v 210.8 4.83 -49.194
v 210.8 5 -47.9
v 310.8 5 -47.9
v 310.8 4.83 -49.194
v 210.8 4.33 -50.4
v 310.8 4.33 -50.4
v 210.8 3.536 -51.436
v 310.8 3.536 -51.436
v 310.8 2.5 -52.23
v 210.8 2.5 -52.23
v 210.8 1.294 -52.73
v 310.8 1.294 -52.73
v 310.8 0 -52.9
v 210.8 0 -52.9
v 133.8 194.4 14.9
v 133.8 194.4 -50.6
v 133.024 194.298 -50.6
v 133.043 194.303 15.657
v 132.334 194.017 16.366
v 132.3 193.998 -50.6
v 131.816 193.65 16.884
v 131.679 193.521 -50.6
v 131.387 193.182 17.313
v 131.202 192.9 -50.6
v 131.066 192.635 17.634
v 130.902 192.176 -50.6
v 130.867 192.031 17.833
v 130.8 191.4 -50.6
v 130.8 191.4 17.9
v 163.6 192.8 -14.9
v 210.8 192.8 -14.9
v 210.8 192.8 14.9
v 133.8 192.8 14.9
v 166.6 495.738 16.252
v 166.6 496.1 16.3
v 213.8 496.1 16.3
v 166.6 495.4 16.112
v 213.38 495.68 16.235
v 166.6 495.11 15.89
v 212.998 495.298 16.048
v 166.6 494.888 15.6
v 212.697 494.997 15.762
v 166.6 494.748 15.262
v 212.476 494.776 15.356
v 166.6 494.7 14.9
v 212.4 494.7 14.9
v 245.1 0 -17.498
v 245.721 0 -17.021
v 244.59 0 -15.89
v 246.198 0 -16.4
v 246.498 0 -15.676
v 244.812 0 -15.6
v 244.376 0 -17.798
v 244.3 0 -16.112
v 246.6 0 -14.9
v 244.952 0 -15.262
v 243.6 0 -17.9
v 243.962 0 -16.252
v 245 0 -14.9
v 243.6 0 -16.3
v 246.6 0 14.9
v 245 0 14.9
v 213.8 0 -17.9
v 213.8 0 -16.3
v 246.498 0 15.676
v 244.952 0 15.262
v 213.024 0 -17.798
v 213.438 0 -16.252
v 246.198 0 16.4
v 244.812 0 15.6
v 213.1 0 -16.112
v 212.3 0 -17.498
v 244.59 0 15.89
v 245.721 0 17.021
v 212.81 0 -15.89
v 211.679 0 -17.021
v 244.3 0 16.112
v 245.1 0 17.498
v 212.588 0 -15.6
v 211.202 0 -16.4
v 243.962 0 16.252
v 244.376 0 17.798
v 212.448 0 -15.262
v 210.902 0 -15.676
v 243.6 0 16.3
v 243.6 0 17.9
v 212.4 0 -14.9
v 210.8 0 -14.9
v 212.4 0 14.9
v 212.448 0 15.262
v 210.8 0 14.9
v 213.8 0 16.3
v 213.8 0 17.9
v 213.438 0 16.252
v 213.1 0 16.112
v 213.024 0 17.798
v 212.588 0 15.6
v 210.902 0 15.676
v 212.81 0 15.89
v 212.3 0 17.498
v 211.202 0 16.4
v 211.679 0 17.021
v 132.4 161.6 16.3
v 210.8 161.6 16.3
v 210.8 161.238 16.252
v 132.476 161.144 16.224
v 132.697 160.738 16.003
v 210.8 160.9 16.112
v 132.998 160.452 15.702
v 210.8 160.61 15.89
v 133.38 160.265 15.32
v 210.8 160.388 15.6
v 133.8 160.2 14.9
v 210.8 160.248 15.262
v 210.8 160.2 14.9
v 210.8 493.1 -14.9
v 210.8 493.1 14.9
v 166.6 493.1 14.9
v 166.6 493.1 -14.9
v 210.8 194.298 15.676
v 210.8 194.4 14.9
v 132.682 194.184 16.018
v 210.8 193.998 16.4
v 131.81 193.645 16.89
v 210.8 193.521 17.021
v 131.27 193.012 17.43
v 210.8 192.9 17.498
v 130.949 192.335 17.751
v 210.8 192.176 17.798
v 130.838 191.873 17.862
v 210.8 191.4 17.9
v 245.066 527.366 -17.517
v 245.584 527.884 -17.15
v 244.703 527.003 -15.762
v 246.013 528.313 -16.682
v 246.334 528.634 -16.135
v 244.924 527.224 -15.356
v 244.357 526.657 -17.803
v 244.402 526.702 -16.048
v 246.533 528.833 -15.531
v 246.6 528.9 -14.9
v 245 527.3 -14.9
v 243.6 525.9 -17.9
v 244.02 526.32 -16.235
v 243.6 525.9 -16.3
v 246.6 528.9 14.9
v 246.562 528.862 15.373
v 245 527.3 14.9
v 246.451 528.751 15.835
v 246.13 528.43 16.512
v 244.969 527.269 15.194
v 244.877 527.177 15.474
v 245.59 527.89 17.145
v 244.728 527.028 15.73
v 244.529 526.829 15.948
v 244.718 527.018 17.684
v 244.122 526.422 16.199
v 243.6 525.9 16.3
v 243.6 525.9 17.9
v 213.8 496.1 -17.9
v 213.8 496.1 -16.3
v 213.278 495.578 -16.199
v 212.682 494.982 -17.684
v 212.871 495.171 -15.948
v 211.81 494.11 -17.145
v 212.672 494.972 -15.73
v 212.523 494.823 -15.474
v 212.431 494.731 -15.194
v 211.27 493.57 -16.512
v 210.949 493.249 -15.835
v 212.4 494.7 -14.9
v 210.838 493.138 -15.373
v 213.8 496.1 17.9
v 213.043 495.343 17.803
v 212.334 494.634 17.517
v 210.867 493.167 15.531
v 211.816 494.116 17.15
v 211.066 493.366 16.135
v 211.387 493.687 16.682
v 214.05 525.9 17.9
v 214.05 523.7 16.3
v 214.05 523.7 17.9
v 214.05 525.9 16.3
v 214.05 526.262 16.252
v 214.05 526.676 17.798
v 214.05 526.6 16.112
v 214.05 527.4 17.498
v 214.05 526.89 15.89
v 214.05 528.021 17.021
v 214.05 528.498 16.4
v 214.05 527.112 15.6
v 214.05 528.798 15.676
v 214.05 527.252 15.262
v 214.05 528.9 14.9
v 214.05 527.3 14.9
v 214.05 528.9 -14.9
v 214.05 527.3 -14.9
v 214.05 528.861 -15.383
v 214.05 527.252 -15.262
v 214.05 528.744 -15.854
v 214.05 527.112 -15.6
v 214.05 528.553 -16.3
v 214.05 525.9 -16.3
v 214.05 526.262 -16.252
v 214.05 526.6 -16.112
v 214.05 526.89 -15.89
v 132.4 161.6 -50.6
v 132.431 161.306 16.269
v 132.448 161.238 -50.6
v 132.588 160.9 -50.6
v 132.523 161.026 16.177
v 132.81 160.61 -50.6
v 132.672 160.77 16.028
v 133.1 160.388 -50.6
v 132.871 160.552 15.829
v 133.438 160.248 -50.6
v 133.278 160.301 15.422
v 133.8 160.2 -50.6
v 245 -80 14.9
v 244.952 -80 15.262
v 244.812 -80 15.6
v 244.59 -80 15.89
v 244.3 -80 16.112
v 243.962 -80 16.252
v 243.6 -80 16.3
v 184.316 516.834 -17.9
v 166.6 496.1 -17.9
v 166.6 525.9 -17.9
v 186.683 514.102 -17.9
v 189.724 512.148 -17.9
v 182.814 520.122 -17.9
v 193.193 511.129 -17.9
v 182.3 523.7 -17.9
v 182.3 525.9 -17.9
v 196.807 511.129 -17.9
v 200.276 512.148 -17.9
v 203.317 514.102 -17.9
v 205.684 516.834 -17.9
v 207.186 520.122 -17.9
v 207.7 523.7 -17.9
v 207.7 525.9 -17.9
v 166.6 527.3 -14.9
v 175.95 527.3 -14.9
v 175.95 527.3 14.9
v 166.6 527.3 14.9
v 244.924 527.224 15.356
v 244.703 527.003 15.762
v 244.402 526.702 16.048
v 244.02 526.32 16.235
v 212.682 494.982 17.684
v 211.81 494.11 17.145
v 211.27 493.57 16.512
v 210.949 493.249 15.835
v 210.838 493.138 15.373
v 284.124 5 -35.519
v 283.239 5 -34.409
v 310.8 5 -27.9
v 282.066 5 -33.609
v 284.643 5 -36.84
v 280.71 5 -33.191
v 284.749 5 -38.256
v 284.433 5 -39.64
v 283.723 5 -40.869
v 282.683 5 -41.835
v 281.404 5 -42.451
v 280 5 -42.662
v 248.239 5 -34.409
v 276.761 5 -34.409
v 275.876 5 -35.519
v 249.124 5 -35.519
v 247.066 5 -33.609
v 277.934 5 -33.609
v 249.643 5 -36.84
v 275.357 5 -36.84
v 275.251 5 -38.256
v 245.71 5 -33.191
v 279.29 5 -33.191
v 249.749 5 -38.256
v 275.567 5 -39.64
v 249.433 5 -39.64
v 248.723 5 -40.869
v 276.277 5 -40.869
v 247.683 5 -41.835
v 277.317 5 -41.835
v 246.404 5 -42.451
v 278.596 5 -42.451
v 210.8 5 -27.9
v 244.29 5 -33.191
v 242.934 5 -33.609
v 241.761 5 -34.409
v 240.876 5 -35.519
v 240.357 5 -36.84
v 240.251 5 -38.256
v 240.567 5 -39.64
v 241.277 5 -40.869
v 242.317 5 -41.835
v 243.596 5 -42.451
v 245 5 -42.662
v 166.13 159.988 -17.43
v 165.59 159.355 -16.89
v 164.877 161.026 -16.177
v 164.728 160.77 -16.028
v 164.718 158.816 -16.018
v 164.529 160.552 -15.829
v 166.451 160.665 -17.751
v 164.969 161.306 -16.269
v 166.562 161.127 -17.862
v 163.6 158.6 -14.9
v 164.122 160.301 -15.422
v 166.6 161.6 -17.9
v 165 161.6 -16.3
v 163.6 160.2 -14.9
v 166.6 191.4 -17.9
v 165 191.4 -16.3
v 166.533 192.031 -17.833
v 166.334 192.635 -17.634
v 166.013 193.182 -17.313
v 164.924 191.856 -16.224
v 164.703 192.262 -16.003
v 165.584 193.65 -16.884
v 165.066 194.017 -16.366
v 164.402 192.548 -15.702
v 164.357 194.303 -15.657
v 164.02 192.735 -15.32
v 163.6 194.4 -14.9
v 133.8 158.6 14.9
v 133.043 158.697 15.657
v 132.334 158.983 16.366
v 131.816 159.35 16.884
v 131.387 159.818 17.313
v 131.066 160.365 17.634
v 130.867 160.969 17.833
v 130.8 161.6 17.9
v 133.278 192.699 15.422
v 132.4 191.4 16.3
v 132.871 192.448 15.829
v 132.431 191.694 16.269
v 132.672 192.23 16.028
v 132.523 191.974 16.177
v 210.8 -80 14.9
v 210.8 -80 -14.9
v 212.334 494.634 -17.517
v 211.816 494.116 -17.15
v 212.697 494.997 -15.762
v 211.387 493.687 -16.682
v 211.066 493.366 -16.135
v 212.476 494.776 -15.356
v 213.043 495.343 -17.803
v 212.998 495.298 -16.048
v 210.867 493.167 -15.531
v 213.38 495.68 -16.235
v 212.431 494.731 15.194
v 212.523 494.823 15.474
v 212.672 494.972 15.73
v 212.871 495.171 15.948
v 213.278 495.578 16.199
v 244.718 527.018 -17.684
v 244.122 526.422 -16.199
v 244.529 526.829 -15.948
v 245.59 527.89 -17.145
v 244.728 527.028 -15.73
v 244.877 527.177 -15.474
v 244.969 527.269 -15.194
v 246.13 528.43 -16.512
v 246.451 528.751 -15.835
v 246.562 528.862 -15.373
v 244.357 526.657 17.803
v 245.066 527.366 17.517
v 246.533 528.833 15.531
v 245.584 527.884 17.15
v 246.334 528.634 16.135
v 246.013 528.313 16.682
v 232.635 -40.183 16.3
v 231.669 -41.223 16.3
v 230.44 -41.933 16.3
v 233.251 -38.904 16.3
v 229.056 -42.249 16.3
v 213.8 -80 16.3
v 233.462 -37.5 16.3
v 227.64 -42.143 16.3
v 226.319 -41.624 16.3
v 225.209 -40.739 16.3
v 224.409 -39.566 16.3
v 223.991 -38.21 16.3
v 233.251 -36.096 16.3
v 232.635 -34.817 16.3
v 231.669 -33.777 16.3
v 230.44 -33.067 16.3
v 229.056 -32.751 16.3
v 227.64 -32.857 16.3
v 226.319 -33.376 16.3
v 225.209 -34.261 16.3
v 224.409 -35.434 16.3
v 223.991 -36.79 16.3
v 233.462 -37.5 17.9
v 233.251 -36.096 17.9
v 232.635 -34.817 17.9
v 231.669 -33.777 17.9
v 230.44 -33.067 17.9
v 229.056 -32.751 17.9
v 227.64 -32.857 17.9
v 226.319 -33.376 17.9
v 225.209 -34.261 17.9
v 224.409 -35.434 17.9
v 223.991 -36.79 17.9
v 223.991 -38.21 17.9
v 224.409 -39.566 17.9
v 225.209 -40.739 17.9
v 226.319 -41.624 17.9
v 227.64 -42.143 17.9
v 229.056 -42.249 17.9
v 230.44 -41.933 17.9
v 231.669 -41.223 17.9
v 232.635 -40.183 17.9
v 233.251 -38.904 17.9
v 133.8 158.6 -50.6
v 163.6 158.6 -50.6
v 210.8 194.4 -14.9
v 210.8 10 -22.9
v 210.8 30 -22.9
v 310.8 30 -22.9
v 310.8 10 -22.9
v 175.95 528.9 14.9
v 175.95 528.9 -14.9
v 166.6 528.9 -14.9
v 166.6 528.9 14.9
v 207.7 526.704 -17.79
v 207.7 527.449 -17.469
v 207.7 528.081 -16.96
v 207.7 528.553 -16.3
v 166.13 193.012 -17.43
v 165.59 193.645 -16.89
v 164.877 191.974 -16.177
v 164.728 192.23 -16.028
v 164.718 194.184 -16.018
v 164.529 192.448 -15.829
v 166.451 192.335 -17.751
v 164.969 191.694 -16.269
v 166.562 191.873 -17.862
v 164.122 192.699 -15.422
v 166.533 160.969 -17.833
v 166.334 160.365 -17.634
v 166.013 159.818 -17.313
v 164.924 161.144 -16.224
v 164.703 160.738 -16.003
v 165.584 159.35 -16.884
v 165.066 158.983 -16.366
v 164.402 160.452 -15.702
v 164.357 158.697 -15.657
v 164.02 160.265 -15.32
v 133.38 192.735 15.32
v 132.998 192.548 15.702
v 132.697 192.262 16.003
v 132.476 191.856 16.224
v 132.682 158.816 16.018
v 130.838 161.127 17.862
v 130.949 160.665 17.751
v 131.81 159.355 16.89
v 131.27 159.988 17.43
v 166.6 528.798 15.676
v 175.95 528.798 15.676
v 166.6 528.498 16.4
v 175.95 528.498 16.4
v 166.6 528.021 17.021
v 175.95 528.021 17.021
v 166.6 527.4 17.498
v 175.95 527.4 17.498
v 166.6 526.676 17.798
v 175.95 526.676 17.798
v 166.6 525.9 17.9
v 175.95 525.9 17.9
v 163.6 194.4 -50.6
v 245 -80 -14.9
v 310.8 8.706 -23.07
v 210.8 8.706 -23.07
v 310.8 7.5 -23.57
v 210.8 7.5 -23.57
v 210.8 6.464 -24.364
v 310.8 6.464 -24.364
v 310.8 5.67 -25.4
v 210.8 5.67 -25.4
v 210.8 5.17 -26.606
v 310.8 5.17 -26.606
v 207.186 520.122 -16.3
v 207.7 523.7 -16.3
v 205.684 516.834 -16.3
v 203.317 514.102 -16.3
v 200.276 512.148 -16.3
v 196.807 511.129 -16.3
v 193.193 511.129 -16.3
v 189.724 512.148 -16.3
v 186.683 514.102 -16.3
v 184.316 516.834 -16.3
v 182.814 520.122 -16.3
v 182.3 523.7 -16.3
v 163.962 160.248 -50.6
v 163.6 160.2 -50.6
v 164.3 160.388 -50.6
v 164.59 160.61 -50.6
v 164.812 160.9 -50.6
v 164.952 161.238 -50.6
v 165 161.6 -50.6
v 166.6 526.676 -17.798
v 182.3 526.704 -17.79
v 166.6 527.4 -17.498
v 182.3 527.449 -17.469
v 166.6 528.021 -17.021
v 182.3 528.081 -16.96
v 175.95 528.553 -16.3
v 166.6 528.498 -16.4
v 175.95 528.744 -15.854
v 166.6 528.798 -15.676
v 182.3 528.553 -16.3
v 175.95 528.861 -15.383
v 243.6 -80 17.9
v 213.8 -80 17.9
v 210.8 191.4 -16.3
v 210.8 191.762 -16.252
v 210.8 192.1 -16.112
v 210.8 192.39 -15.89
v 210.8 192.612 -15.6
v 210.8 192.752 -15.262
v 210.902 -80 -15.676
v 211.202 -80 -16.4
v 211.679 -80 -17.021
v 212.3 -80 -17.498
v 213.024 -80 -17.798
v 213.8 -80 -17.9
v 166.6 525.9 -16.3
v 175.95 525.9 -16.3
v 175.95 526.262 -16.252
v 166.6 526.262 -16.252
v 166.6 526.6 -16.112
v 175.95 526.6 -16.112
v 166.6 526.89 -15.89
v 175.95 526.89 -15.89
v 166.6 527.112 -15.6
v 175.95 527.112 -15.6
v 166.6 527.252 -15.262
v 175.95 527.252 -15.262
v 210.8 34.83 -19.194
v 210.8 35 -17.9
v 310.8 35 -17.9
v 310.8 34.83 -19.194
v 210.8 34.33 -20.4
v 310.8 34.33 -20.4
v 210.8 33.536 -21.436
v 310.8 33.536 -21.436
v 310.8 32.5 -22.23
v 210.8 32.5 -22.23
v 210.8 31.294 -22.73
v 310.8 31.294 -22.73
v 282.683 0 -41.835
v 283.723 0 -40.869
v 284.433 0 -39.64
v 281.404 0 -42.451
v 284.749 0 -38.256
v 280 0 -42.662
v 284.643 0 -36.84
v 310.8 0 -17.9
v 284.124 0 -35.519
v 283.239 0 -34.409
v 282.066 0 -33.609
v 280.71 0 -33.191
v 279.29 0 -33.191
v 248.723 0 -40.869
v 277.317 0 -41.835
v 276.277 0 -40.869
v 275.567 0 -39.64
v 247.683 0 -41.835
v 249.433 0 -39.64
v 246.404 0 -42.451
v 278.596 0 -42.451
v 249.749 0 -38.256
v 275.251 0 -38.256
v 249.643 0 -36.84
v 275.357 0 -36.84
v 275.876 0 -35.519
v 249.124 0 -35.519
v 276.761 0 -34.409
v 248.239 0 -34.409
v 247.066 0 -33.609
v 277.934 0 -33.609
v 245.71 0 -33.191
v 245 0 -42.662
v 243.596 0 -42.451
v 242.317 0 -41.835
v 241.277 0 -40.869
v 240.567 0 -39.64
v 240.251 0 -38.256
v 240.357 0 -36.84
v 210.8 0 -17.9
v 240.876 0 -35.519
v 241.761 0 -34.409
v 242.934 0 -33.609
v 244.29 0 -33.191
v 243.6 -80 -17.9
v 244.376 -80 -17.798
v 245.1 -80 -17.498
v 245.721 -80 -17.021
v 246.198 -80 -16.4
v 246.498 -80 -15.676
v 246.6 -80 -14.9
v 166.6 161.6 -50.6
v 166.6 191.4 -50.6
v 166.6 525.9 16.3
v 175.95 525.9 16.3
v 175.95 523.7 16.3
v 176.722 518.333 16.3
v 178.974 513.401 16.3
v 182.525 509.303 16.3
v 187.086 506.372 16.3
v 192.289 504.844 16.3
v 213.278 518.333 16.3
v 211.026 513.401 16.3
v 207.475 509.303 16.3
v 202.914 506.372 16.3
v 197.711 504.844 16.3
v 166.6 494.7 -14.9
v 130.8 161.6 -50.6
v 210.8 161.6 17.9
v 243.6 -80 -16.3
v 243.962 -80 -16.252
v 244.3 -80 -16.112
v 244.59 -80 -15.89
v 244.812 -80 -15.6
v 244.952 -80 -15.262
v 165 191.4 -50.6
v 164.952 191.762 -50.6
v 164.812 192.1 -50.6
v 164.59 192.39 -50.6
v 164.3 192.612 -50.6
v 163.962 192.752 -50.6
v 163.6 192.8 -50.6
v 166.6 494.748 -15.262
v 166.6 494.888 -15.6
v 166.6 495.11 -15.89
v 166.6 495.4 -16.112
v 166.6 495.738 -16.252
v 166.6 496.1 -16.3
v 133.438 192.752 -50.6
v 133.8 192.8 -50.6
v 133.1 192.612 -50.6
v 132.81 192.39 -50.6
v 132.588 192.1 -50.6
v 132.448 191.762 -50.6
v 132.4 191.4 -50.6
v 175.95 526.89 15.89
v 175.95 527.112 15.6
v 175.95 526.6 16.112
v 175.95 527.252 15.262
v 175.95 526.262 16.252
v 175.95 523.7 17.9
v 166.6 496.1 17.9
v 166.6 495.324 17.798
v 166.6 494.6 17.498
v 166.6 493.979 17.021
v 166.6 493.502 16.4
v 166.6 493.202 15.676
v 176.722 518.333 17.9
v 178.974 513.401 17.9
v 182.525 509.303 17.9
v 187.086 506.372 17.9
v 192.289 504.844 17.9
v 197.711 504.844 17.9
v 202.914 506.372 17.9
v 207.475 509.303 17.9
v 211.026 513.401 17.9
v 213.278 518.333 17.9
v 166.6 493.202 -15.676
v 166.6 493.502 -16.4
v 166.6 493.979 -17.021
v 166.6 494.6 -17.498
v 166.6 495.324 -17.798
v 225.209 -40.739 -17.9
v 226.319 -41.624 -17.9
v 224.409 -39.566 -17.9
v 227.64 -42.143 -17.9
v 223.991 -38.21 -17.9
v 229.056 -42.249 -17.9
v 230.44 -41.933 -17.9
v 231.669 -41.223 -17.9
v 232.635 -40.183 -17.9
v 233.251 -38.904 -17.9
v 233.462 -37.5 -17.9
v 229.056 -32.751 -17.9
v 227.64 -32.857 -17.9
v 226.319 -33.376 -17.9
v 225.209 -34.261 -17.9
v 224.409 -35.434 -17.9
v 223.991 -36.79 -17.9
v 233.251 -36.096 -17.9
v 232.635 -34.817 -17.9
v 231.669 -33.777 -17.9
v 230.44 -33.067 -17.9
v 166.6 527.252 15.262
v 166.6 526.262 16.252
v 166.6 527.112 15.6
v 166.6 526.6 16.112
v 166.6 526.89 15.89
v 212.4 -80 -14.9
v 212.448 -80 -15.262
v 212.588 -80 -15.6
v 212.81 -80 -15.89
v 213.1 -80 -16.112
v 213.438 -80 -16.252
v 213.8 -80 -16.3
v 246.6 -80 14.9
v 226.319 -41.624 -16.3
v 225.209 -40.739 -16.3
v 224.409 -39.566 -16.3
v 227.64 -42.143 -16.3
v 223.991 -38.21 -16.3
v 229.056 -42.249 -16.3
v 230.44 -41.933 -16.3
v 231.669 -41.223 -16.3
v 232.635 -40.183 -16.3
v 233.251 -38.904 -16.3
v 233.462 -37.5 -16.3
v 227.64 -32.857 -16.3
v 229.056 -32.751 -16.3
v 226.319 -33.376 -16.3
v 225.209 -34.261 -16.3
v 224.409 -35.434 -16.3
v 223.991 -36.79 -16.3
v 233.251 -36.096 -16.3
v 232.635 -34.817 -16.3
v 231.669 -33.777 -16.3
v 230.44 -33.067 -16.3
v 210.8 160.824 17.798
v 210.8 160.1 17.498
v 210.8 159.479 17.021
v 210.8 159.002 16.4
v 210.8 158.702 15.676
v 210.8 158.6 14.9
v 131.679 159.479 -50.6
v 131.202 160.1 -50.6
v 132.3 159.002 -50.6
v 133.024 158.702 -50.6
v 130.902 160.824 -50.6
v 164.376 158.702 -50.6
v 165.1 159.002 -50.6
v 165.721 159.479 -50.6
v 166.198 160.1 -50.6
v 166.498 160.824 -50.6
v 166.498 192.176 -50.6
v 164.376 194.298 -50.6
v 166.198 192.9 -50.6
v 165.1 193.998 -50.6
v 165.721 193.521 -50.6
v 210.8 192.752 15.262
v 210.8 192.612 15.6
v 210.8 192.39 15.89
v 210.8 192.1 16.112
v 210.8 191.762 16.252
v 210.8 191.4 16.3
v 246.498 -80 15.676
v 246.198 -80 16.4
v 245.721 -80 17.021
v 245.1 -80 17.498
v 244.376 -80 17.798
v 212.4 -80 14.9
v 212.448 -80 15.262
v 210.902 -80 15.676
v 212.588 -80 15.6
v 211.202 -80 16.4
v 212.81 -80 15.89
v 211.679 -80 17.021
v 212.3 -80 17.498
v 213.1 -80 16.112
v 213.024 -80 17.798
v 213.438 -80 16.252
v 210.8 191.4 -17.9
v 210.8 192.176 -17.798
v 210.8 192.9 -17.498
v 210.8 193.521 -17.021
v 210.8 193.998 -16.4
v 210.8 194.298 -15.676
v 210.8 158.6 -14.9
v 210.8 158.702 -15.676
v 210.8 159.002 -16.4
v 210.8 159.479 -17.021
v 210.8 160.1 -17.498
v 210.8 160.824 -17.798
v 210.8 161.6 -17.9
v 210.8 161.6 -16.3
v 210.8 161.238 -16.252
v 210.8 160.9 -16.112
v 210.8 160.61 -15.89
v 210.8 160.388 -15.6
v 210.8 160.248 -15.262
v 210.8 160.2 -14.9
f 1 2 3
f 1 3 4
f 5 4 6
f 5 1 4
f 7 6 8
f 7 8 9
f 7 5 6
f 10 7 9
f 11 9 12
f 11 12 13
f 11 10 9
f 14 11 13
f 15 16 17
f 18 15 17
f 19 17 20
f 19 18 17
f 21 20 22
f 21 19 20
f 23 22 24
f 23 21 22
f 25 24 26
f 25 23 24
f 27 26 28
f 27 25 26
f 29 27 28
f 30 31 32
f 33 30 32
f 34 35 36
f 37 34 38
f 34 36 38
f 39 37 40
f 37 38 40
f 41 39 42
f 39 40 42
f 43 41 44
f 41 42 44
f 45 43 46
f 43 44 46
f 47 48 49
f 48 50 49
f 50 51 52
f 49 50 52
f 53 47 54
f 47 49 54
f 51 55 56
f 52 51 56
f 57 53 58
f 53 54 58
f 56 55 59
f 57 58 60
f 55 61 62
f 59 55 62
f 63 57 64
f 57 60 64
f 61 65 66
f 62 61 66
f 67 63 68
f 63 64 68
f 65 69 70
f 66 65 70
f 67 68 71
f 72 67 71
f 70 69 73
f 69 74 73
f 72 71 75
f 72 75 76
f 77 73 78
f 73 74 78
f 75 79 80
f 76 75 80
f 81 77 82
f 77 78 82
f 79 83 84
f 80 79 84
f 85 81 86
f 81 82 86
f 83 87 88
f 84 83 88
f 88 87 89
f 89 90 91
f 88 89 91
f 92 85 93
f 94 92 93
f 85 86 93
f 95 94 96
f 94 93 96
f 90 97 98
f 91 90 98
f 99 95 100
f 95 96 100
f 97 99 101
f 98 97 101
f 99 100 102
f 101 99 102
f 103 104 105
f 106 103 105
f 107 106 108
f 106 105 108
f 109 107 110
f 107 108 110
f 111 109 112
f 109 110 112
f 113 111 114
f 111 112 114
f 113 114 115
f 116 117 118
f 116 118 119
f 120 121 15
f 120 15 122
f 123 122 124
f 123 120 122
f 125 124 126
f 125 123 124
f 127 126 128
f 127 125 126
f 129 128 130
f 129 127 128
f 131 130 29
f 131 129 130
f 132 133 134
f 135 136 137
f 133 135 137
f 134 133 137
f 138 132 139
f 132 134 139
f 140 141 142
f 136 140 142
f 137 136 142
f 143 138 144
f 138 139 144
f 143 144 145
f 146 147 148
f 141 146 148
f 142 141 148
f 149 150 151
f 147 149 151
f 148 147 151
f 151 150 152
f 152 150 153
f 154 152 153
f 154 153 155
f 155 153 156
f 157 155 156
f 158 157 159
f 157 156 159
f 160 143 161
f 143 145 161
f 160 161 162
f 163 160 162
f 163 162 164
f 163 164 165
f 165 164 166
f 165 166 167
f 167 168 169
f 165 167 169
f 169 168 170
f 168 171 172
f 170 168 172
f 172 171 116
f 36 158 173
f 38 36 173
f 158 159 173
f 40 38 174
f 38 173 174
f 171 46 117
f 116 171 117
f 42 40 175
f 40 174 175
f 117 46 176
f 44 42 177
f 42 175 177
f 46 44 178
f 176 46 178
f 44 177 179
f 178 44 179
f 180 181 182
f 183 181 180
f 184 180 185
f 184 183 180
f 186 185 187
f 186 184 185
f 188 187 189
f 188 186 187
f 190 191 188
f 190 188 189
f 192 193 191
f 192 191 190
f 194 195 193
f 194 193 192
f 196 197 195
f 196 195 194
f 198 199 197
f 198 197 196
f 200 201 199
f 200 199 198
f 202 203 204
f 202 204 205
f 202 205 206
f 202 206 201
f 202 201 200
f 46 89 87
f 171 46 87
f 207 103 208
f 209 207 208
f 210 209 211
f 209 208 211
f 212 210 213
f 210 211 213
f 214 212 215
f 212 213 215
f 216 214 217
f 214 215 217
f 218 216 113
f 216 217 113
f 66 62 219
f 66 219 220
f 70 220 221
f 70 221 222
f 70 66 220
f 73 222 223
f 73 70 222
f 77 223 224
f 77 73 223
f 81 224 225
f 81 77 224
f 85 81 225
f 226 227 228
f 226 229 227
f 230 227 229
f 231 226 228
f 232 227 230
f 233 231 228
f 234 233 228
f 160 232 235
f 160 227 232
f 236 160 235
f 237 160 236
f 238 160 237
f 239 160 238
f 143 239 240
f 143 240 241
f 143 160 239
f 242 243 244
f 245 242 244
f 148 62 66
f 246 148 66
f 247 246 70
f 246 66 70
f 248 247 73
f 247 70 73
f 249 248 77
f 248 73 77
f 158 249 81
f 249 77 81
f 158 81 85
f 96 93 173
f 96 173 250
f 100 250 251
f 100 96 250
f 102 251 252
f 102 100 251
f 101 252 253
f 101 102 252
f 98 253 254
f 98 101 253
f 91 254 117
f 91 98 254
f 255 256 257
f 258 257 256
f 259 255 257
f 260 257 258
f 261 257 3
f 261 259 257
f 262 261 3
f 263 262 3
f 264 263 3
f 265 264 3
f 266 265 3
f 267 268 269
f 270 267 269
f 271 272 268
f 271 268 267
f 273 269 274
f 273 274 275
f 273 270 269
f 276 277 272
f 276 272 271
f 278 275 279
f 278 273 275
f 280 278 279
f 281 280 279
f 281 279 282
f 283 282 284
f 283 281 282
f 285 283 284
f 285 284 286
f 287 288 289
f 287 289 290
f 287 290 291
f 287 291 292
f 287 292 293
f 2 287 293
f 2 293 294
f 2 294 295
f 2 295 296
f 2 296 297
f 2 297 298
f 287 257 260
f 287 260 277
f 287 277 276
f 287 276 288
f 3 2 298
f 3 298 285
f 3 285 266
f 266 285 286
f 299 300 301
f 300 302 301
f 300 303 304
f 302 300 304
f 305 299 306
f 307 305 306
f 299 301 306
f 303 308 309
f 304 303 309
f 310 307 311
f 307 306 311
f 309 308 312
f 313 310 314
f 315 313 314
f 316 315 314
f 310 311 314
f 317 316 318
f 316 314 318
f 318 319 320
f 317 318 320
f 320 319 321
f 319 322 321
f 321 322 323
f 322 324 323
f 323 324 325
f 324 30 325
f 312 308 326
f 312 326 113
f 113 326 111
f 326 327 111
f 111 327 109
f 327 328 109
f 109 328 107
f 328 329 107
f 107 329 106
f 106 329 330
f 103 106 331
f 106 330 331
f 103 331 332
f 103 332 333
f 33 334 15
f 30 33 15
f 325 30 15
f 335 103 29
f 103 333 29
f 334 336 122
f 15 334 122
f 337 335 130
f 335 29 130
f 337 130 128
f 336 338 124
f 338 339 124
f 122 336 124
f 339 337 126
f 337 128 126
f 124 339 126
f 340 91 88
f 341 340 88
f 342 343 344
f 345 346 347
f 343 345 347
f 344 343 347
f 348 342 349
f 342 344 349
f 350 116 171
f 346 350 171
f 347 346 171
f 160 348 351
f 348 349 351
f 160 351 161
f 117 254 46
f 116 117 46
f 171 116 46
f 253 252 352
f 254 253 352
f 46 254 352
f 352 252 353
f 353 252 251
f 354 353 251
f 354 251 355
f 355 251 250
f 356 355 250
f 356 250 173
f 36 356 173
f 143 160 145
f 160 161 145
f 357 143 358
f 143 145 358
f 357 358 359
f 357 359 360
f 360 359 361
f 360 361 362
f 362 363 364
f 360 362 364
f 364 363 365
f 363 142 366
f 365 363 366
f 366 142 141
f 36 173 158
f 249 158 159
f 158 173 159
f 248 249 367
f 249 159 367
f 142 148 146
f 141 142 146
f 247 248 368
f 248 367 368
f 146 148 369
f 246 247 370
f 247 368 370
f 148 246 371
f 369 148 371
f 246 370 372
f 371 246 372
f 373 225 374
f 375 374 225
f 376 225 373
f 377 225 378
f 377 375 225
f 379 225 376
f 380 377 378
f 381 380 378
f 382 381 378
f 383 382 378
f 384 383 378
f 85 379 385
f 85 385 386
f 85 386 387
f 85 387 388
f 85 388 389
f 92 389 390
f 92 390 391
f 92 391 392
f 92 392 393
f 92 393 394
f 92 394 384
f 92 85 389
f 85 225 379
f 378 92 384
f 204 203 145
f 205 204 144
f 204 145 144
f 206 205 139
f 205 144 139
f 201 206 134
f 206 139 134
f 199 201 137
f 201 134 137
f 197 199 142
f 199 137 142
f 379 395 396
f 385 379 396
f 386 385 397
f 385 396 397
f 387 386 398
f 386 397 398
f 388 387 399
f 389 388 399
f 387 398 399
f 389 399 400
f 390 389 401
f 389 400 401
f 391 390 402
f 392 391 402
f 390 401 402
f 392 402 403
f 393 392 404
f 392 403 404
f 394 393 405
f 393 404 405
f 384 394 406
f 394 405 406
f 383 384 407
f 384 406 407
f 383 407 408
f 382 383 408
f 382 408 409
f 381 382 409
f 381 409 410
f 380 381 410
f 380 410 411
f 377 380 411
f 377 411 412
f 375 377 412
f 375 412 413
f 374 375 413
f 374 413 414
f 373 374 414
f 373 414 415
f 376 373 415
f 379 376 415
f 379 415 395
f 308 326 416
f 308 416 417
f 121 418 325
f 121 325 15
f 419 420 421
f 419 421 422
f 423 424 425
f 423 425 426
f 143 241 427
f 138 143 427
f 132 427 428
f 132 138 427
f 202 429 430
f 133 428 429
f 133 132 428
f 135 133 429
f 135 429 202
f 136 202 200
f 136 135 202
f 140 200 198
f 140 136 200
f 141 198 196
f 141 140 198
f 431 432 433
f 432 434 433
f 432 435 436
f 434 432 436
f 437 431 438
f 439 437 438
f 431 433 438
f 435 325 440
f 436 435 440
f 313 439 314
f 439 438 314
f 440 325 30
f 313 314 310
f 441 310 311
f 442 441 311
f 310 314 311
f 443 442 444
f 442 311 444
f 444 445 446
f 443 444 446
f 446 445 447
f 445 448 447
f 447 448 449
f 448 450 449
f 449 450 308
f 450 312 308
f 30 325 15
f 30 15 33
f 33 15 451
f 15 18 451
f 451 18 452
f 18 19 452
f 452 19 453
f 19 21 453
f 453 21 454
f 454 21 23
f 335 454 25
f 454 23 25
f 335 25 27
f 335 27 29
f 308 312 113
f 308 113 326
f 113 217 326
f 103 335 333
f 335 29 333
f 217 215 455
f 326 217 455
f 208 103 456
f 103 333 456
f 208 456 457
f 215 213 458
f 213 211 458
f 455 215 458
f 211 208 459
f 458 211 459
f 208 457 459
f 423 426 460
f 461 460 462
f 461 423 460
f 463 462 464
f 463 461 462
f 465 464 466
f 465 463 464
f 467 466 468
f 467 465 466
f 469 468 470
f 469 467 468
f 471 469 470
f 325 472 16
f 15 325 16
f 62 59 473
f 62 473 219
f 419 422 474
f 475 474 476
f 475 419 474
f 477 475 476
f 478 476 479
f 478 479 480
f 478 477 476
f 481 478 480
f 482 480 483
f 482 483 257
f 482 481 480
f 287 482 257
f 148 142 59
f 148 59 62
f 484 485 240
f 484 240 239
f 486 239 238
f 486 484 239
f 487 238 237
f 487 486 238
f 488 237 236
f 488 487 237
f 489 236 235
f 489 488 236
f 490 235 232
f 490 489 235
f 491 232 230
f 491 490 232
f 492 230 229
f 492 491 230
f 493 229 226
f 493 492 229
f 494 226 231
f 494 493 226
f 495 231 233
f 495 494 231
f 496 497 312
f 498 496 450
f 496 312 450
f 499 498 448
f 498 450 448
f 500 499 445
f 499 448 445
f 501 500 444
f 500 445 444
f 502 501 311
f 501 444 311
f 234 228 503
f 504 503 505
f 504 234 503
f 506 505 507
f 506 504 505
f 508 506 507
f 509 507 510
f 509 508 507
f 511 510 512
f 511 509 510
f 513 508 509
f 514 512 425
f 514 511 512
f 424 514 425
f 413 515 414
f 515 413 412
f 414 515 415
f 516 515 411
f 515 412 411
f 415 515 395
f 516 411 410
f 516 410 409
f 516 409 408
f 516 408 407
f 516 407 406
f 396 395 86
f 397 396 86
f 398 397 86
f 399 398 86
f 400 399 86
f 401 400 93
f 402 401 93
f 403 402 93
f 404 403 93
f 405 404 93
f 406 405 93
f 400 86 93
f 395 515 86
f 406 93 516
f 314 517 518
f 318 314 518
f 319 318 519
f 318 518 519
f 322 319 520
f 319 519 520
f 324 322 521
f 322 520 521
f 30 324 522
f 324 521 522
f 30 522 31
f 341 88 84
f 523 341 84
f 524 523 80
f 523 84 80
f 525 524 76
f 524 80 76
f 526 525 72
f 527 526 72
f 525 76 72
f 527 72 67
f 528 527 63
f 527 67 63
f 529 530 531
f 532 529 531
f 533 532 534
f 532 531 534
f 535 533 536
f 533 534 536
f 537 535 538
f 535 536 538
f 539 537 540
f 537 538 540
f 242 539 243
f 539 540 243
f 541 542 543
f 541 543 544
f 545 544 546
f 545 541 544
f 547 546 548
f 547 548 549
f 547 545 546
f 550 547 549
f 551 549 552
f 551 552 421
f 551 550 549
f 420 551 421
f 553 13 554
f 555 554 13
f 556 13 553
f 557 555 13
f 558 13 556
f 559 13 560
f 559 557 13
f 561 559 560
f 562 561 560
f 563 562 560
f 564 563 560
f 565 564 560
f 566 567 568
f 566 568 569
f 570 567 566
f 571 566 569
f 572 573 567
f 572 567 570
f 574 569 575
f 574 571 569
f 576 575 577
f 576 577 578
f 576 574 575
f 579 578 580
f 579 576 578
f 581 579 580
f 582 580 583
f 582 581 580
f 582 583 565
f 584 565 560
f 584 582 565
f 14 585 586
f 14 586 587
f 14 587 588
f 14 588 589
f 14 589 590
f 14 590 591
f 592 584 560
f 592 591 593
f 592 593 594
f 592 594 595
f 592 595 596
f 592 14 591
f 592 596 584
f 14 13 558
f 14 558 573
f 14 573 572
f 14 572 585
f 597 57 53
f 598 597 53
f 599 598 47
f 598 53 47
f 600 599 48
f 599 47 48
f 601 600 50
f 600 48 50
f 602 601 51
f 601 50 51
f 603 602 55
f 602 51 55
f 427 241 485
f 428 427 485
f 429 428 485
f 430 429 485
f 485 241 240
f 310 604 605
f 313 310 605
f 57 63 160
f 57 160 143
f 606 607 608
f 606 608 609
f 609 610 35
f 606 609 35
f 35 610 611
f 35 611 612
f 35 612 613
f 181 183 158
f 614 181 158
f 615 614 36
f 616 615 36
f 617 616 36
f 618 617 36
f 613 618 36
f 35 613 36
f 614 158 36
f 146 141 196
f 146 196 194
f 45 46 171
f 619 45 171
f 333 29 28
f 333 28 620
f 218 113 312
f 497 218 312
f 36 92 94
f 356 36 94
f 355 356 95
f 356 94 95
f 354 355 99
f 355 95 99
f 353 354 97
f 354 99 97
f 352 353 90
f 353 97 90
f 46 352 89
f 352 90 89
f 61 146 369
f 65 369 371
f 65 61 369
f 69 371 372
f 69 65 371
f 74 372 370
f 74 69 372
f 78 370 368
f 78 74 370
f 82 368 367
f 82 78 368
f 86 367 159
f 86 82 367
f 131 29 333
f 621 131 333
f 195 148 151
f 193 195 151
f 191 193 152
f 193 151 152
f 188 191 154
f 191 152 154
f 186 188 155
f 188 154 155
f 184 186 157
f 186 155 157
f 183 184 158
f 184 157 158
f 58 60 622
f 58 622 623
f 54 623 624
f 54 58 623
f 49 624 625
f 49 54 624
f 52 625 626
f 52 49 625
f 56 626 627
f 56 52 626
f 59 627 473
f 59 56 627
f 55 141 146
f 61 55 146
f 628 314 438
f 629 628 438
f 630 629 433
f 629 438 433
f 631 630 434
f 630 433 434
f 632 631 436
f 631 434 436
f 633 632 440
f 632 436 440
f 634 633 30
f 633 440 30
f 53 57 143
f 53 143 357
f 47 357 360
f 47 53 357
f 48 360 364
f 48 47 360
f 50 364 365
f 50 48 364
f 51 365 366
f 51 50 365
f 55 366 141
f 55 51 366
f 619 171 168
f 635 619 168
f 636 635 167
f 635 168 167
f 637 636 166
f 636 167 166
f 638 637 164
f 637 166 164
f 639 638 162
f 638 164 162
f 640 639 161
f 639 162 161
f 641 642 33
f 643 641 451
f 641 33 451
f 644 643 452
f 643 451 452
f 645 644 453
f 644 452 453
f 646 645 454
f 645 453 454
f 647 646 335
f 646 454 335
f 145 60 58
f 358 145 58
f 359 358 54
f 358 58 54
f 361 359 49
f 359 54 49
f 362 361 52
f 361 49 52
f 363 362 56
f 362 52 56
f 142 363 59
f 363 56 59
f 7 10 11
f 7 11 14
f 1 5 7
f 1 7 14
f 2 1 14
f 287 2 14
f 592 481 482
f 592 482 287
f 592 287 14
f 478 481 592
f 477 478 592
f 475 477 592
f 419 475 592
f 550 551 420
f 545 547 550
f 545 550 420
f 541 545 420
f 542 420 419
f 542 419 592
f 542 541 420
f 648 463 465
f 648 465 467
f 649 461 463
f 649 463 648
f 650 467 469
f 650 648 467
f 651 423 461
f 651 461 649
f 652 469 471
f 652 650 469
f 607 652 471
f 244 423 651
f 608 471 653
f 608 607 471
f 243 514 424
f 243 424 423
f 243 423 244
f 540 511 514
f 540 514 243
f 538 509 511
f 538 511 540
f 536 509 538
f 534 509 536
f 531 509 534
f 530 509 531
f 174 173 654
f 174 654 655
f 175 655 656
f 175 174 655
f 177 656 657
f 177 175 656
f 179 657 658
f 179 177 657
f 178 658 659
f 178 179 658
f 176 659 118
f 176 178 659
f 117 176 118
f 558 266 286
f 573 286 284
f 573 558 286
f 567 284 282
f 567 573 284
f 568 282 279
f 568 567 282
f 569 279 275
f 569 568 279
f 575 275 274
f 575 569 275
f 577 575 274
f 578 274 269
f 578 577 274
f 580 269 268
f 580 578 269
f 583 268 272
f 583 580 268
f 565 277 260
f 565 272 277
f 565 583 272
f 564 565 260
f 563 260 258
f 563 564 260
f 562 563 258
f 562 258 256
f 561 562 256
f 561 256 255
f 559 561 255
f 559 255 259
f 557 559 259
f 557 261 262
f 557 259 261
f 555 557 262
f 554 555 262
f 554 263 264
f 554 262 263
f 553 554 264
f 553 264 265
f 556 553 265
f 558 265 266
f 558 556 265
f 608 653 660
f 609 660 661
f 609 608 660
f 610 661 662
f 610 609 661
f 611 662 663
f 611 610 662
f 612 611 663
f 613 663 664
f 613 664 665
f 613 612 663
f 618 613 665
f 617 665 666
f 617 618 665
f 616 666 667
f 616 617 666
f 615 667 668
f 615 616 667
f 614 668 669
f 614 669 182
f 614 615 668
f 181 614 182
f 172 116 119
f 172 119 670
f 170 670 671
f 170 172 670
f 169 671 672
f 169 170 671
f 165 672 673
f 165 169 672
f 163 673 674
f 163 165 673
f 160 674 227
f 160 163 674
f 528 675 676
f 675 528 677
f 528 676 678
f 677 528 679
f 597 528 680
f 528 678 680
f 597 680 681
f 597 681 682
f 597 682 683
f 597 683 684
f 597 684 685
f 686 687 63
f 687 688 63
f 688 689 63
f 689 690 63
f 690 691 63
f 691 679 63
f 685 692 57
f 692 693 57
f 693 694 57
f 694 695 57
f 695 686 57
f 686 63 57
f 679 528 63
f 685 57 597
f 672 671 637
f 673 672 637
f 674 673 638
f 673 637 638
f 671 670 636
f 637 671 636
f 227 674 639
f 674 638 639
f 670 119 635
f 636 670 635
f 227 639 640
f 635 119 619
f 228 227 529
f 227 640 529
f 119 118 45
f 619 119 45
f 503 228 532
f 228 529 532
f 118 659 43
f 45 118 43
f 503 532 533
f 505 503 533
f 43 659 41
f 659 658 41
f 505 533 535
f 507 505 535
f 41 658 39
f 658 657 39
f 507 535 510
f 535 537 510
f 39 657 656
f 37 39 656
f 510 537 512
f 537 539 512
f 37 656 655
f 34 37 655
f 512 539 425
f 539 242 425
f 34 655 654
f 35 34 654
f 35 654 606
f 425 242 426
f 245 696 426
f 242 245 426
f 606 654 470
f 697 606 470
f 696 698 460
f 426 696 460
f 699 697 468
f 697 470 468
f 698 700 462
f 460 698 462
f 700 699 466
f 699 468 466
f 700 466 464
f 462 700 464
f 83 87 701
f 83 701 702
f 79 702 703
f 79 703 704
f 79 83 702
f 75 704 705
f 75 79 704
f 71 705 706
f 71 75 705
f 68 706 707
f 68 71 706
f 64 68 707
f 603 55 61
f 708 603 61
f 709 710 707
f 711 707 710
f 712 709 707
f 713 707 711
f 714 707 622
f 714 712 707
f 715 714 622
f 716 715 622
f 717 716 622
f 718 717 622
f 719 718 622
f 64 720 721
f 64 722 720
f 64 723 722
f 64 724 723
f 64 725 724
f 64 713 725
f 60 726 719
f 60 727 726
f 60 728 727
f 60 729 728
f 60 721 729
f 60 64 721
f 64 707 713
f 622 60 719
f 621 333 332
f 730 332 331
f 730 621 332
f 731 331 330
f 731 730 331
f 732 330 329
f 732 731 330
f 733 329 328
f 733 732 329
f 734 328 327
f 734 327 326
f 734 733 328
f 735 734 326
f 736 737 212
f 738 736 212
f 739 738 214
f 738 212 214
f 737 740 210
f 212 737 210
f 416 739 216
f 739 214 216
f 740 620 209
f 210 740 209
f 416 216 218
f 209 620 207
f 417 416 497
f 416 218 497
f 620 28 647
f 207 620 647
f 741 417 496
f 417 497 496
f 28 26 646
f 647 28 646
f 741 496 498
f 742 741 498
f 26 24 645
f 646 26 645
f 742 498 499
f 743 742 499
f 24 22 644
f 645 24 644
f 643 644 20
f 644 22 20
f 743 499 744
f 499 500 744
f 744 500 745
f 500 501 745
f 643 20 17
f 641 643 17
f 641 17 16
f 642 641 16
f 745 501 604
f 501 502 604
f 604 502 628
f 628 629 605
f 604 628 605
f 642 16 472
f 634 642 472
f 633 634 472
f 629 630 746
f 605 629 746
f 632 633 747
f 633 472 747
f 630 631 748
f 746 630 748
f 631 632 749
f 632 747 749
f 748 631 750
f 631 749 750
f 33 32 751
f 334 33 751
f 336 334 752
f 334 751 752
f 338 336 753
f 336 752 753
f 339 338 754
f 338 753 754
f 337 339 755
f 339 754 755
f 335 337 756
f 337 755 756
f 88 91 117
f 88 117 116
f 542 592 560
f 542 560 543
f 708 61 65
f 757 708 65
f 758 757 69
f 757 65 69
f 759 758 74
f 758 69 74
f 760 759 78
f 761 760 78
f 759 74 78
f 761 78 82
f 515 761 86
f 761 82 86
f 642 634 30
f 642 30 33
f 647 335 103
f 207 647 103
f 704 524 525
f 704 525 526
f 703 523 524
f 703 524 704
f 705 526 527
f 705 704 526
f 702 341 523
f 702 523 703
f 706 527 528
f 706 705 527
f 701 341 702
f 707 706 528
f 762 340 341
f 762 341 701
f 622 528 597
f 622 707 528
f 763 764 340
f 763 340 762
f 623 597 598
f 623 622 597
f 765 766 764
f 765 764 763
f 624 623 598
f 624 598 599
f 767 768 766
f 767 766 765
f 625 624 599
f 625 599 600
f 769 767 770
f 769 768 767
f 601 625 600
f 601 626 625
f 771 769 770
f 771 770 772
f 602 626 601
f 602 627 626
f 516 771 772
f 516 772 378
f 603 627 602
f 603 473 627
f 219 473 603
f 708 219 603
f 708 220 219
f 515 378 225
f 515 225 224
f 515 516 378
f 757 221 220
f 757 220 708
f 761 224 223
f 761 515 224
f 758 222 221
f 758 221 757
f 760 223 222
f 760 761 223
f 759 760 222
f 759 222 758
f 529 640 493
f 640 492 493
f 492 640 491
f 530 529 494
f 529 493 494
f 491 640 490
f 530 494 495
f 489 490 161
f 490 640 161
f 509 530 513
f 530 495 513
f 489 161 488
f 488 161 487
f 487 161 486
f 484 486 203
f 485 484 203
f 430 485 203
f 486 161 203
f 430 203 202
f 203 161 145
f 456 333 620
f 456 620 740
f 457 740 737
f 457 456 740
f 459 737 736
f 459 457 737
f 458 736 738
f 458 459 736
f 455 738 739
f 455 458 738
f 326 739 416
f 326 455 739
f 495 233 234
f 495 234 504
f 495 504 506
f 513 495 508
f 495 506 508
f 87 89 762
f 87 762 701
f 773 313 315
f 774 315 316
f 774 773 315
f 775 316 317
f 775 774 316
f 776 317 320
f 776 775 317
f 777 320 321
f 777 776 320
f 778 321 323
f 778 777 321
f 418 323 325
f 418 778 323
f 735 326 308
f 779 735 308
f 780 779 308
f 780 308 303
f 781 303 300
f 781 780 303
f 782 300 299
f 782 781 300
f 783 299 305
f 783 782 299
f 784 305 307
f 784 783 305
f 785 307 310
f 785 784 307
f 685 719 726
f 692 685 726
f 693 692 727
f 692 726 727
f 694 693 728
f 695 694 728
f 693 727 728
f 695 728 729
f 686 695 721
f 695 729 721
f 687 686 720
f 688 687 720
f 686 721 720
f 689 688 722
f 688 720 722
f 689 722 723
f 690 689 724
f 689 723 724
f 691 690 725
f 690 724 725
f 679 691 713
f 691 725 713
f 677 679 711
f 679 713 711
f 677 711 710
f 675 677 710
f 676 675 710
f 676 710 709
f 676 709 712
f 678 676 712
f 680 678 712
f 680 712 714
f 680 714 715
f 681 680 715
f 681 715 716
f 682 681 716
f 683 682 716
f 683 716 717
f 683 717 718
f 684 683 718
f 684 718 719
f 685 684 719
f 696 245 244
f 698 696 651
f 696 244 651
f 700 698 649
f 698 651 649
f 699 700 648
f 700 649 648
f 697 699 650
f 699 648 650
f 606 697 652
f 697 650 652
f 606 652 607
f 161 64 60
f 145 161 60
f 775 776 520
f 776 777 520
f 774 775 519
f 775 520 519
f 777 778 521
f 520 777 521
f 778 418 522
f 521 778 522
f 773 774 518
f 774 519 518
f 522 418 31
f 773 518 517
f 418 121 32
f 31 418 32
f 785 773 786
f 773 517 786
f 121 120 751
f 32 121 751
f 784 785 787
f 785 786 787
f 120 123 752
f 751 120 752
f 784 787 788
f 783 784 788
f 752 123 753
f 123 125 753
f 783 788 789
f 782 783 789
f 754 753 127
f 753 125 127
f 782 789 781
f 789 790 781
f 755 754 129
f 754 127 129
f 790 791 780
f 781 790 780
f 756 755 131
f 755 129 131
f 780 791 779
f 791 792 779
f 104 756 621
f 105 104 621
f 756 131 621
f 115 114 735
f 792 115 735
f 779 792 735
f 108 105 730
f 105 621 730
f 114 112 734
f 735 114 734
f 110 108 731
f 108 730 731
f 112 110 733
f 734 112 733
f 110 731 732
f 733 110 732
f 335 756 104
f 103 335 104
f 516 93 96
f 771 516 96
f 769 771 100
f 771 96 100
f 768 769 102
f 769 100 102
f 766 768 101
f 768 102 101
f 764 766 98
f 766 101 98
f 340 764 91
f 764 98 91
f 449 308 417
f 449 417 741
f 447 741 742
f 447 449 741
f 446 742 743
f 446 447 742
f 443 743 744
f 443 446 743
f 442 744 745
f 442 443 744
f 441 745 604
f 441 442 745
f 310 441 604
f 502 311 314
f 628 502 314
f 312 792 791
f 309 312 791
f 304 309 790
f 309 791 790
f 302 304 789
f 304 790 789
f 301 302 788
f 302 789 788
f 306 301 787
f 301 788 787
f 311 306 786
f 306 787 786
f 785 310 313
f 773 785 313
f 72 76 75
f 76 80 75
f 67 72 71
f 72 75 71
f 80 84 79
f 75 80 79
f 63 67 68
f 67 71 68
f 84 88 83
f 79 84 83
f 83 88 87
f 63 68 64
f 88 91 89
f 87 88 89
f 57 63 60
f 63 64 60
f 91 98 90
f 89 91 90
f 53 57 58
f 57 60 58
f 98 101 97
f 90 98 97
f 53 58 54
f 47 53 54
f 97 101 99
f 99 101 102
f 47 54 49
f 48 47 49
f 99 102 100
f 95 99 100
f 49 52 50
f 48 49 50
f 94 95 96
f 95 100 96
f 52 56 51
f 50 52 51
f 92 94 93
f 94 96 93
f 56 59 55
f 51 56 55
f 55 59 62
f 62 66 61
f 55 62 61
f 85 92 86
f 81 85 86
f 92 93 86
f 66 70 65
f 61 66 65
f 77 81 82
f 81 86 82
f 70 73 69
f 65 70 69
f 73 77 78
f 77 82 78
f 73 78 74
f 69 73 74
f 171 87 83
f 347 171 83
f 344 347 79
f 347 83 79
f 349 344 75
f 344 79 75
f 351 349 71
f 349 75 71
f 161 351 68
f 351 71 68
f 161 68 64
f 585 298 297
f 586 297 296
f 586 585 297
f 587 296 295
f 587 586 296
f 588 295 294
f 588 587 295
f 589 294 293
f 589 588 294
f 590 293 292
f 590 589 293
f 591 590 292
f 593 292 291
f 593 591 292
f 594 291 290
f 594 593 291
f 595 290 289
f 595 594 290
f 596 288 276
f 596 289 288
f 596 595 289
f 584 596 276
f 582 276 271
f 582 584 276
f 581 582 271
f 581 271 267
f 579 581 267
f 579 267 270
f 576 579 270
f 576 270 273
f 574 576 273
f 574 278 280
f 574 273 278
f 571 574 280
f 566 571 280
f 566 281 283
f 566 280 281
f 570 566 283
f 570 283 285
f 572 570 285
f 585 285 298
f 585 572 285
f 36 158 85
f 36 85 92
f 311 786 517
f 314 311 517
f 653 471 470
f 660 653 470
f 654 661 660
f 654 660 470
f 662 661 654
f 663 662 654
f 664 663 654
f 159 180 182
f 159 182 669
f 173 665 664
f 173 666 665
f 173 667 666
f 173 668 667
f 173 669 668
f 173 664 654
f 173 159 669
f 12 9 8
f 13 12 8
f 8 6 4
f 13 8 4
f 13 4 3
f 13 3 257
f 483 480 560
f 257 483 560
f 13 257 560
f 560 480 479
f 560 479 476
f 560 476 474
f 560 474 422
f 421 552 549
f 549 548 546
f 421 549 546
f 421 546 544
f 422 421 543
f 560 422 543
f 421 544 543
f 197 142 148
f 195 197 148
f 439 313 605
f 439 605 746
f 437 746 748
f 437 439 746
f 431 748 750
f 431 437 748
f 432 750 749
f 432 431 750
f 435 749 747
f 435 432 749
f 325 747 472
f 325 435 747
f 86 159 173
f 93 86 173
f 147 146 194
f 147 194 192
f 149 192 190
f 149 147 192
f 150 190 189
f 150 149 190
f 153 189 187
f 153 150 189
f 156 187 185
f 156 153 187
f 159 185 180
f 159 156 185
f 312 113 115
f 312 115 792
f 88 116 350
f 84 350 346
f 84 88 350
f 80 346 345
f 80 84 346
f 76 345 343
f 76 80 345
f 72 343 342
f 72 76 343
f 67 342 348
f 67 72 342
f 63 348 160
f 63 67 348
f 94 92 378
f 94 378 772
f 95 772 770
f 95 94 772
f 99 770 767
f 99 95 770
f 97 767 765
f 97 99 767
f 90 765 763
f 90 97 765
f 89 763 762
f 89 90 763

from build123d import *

# Parameters (mm, degrees)
STRUCTURAL_MEMBERMAIN_DEPTH        = 1
STRUCTURAL_MEMBERMAIN_DEPTH_BACK   = 80
STRUCTURAL_MEMBERMAIN_2_DEPTH      = 538.314422766
STRUCTURAL_MEMBERMAIN_3_DEPTH      = 88.414422766
CUT_EXTRUDETOPRAILGUIDE_DEPTH      = 584.83831666
CUT_EXTRUDETOPRAILGUIDE_DEPTH_BACK = 584.83831666
STRUCTURAL_MEMBERANGLE_DEPTH       = 100
SKETCH15_R                         = 4.7625
CUT_EXTRUDEMOUNTINGHOLES_DEPTH     = 616.735543882
CUT_EXTRUDEENLARGERAILGUIDE_START  = -16.3
CUT_EXTRUDEENLARGERAILGUIDE_DEPTH  = 34.2
STRUCTURAL_MEMBER2_DEPTH           = 106.314422766
STRUCTURAL_MEMBER2_2_DEPTH         = 76.914422766
SKETCH111_R                        = 4.7625
CUT_EXTRUDE1_DEPTH                 = 618.530962786


with BuildPart() as part:
    # Sketch11 → Structural MemberMain (new, two sides)
    with BuildSketch(Plane(origin=(228.7, 0, 0), x_dir=(-1, 0, 0), z_dir=(0, 1, 0))) as structural_membermain_sk:
        with BuildLine():
            Line((-14.9, 17.9), (14.9, 17.9))
            ThreePointArc((14.9, 17.9), (17.021320344, 17.021320344), (17.9, 14.9))
            Line((17.9, 14.9), (17.9, -14.9))
            ThreePointArc((17.9, -14.9), (17.021320344, -17.021320344), (14.9, -17.9))
            Line((14.9, -17.9), (-14.9, -17.9))
            ThreePointArc((-14.9, -17.9), (-17.021320344, -17.021320344), (-17.9, -14.9))
            Line((-17.9, -14.9), (-17.9, 14.9))
            ThreePointArc((-17.9, 14.9), (-17.021320344, 17.021320344), (-14.9, 17.9))
        make_face()
        with BuildLine():
            Line((-14.9, 16.3), (14.9, 16.3))
            ThreePointArc((14.9, 16.3), (15.889949494, 15.889949494), (16.3, 14.9))
            Line((16.3, 14.9), (16.3, -14.9))
            ThreePointArc((16.3, -14.9), (15.889949494, -15.889949494), (14.9, -16.3))
            Line((14.9, -16.3), (-14.9, -16.3))
            ThreePointArc((-14.9, -16.3), (-15.889949494, -15.889949494), (-16.3, -14.9))
            Line((-16.3, -14.9), (-16.3, 14.9))
            ThreePointArc((-16.3, 14.9), (-15.889949494, 15.889949494), (-14.9, 16.3))
        make_face(mode=Mode.SUBTRACT)
    extrude(amount=STRUCTURAL_MEMBERMAIN_DEPTH)
    extrude(structural_membermain_sk.sketch, amount=-STRUCTURAL_MEMBERMAIN_DEPTH_BACK)

    # Structural MemberMain mitre 1
    split(bisect_by=Plane(origin=(228.7, 0, 0), x_dir=(1, 0, 0), z_dir=(0, -1, 0)), keep=Keep.TOP)

    # Sketch111 → Cut-Extrude1 (cut, through all)
    with BuildSketch(Plane.XY.offset(17.9)):
        with Locations((228.7, -37.5)):
            Circle(SKETCH111_R)
    extrude(amount=-CUT_EXTRUDE1_DEPTH, mode=Mode.SUBTRACT)


with BuildPart() as body_2:
    # Sketch11 on segment 2 (carried to segment 2) → Structural MemberMain 2 (new body)
    with BuildSketch(Plane(origin=(228.7, -1, 0), x_dir=(-1, 0, 0), z_dir=(0, 1, 0))):
        with BuildLine():
            Line((-14.9, 17.9), (14.9, 17.9))
            ThreePointArc((14.9, 17.9), (17.021320344, 17.021320344), (17.9, 14.9))
            Line((17.9, 14.9), (17.9, -14.9))
            ThreePointArc((17.9, -14.9), (17.021320344, -17.021320344), (14.9, -17.9))
            Line((14.9, -17.9), (-14.9, -17.9))
            ThreePointArc((-14.9, -17.9), (-17.021320344, -17.021320344), (-17.9, -14.9))
            Line((-17.9, -14.9), (-17.9, 14.9))
            ThreePointArc((-17.9, 14.9), (-17.021320344, 17.021320344), (-14.9, 17.9))
        make_face()
        with BuildLine():
            Line((-14.9, 16.3), (14.9, 16.3))
            ThreePointArc((14.9, 16.3), (15.889949494, 15.889949494), (16.3, 14.9))
            Line((16.3, 14.9), (16.3, -14.9))
            ThreePointArc((16.3, -14.9), (15.889949494, -15.889949494), (14.9, -16.3))
            Line((14.9, -16.3), (-14.9, -16.3))
            ThreePointArc((-14.9, -16.3), (-15.889949494, -15.889949494), (-16.3, -14.9))
            Line((-16.3, -14.9), (-16.3, 14.9))
            ThreePointArc((-16.3, 14.9), (-15.889949494, 15.889949494), (-14.9, 16.3))
        make_face(mode=Mode.SUBTRACT)
    extrude(amount=STRUCTURAL_MEMBERMAIN_2_DEPTH)

    # Structural MemberMain 2 mitre 1
    split(bisect_by=Plane(origin=(228.7, 0, 0), x_dir=(-1, 0, 0), z_dir=(0, 1, 0)), keep=Keep.TOP)

    # Structural MemberMain 2 mitre 2
    split(bisect_by=Plane(origin=(228.7, 511, 0), x_dir=(0.707106781, 0.707106781, 0), z_dir=(0.707106781, -0.707106781, 0)), keep=Keep.TOP)


with BuildPart() as body_3:
    # Sketch11 on segment 3 (carried to segment 3) → Structural MemberMain 3 (new body)
    with BuildSketch(Plane(origin=(255.014422766, 511, 0), x_dir=(0, -1, 0), z_dir=(-1, 0, 0))):
        with BuildLine():
            Line((-14.9, 17.9), (14.9, 17.9))
            ThreePointArc((14.9, 17.9), (17.021320344, 17.021320344), (17.9, 14.9))
            Line((17.9, 14.9), (17.9, -14.9))
            ThreePointArc((17.9, -14.9), (17.021320344, -17.021320344), (14.9, -17.9))
            Line((14.9, -17.9), (-14.9, -17.9))
            ThreePointArc((-14.9, -17.9), (-17.021320344, -17.021320344), (-17.9, -14.9))
            Line((-17.9, -14.9), (-17.9, 14.9))
            ThreePointArc((-17.9, 14.9), (-17.021320344, 17.021320344), (-14.9, 17.9))
        make_face()
        with BuildLine():
            Line((-14.9, 16.3), (14.9, 16.3))
            ThreePointArc((14.9, 16.3), (15.889949494, 15.889949494), (16.3, 14.9))
            Line((16.3, 14.9), (16.3, -14.9))
            ThreePointArc((16.3, -14.9), (15.889949494, -15.889949494), (14.9, -16.3))
            Line((14.9, -16.3), (-14.9, -16.3))
            ThreePointArc((-14.9, -16.3), (-15.889949494, -15.889949494), (-16.3, -14.9))
            Line((-16.3, -14.9), (-16.3, 14.9))
            ThreePointArc((-16.3, 14.9), (-15.889949494, 15.889949494), (-14.9, 16.3))
        make_face(mode=Mode.SUBTRACT)
    extrude(amount=STRUCTURAL_MEMBERMAIN_3_DEPTH)

    # Structural MemberMain 3 mitre 1
    split(bisect_by=Plane(origin=(228.7, 511, 0), x_dir=(-0.707106781, -0.707106781, 0), z_dir=(-0.707106781, 0.707106781, 0)), keep=Keep.TOP)

    # Sketch12 → Cut-ExtrudeTopRailGuide (cut, two sides)
    with BuildSketch(Plane.XY) as cut_extrudetoprailguide_sk:
        with BuildLine():
            Line((182.3, 523.7), (182.3, 534.1))
            ThreePointArc((182.3, 534.1), (195, 546.8), (207.7, 534.1))
            Line((207.7, 534.1), (207.7, 523.7))
            ThreePointArc((207.7, 523.7), (195, 511), (182.3, 523.7))
        make_face()
    extrude(amount=CUT_EXTRUDETOPRAILGUIDE_DEPTH, mode=Mode.SUBTRACT)
    extrude(cut_extrudetoprailguide_sk.sketch, amount=-CUT_EXTRUDETOPRAILGUIDE_DEPTH_BACK, mode=Mode.SUBTRACT)

    # Sketch16 → Cut-ExtrudeEnlargeRailGuide (cut)
    with BuildSketch(Plane.XY.offset(CUT_EXTRUDEENLARGERAILGUIDE_START)):
        with BuildLine():
            Line((214.05, 523.7), (214.05, 534.1))
            ThreePointArc((214.05, 534.1), (195, 553.15), (175.95, 534.1))
            Line((175.95, 534.1), (175.95, 523.7))
            ThreePointArc((175.95, 523.7), (195, 504.65), (214.05, 523.7))
        make_face()
    extrude(amount=CUT_EXTRUDEENLARGERAILGUIDE_DEPTH, mode=Mode.SUBTRACT)


with BuildPart() as body_4:
    # Sketch14 → Structural MemberAngle (new body)
    with BuildSketch(Plane(origin=(210.8, 0, -17.9), x_dir=(0, 0, -1), z_dir=(1, 0, 0))):
        with BuildLine():
            Line((0, 0), (0, 35))
            ThreePointArc((0, 35), (3.535533906, 33.535533906), (5, 30))
            Line((5, 30), (5, 10))
            ThreePointArc((5, 10), (6.464466094, 6.464466094), (10, 5))
            Line((10, 5), (30, 5))
            ThreePointArc((30, 5), (33.535533906, 3.535533906), (35, 0))
            Line((35, 0), (0, 0))
        make_face()
    extrude(amount=STRUCTURAL_MEMBERANGLE_DEPTH)

    # Sketch15 → Cut-ExtrudeMountingHoles (cut, through all)
    with BuildSketch(Plane(origin=(0, 0, 0), x_dir=(1, 0, 0), z_dir=(0, 1, 0))):
        with Locations(Location((245, 37.9, 0), (0, 0, 90))):
            Circle(SKETCH15_R)
        with Locations(Location((280, 37.9, 0), (0, 0, 90))):
            Circle(SKETCH15_R)
    extrude(amount=CUT_EXTRUDEMOUNTINGHOLES_DEPTH, mode=Mode.SUBTRACT)


with BuildPart() as body_5:
    # Sketch110 → Structural Member2 (new body)
    with BuildSketch(Plane(origin=(228.7, 176.5, 0), x_dir=(0, 0, 1), z_dir=(-1, 0, 0))):
        with BuildLine():
            Line((-14.9, 17.9), (14.9, 17.9))
            ThreePointArc((14.9, 17.9), (17.021320344, 17.021320344), (17.9, 14.9))
            Line((17.9, 14.9), (17.9, -14.9))
            ThreePointArc((17.9, -14.9), (17.021320344, -17.021320344), (14.9, -17.9))
            Line((14.9, -17.9), (-14.9, -17.9))
            ThreePointArc((-14.9, -17.9), (-17.021320344, -17.021320344), (-17.9, -14.9))
            Line((-17.9, -14.9), (-17.9, 14.9))
            ThreePointArc((-17.9, 14.9), (-17.021320344, 17.021320344), (-14.9, 17.9))
        make_face()
        with BuildLine():
            Line((-14.9, 16.3), (14.9, 16.3))
            ThreePointArc((14.9, 16.3), (15.889949494, 15.889949494), (16.3, 14.9))
            Line((16.3, 14.9), (16.3, -14.9))
            ThreePointArc((16.3, -14.9), (15.889949494, -15.889949494), (14.9, -16.3))
            Line((14.9, -16.3), (-14.9, -16.3))
            ThreePointArc((-14.9, -16.3), (-15.889949494, -15.889949494), (-16.3, -14.9))
            Line((-16.3, -14.9), (-16.3, 14.9))
            ThreePointArc((-16.3, 14.9), (-15.889949494, 15.889949494), (-14.9, 16.3))
        make_face(mode=Mode.SUBTRACT)
    extrude(amount=STRUCTURAL_MEMBER2_DEPTH)

    # Structural Member2 mitre 1
    split(bisect_by=Plane(origin=(148.7, 176.5, 0), x_dir=(0, 1, 0), z_dir=(0.707106781, 0, 0.707106781)), keep=Keep.TOP)

    # Trim_Extend1 15
    split(bisect_by=Plane(origin=(210.8, 246.55, 0), x_dir=(0, -1, 0), z_dir=(-1, 0, 0)), keep=Keep.TOP)


with BuildPart() as body_6:
    # Sketch110 on segment 2 (carried to segment 2) → Structural Member2 2 (new body)
    with BuildSketch(Plane(origin=(148.7, 176.5, 26.314422766), x_dir=(-1, 0, 0), z_dir=(0, 0, -1))):
        with BuildLine():
            Line((-14.9, 17.9), (14.9, 17.9))
            ThreePointArc((14.9, 17.9), (17.021320344, 17.021320344), (17.9, 14.9))
            Line((17.9, 14.9), (17.9, -14.9))
            ThreePointArc((17.9, -14.9), (17.021320344, -17.021320344), (14.9, -17.9))
            Line((14.9, -17.9), (-14.9, -17.9))
            ThreePointArc((-14.9, -17.9), (-17.021320344, -17.021320344), (-17.9, -14.9))
            Line((-17.9, -14.9), (-17.9, 14.9))
            ThreePointArc((-17.9, 14.9), (-17.021320344, 17.021320344), (-14.9, 17.9))
        make_face()
        with BuildLine():
            Line((-14.9, 16.3), (14.9, 16.3))
            ThreePointArc((14.9, 16.3), (15.889949494, 15.889949494), (16.3, 14.9))
            Line((16.3, 14.9), (16.3, -14.9))
            ThreePointArc((16.3, -14.9), (15.889949494, -15.889949494), (14.9, -16.3))
            Line((14.9, -16.3), (-14.9, -16.3))
            ThreePointArc((-14.9, -16.3), (-15.889949494, -15.889949494), (-16.3, -14.9))
            Line((-16.3, -14.9), (-16.3, 14.9))
            ThreePointArc((-16.3, 14.9), (-15.889949494, 15.889949494), (-14.9, 16.3))
        make_face(mode=Mode.SUBTRACT)
    extrude(amount=STRUCTURAL_MEMBER2_2_DEPTH)

    # Structural Member2 2 mitre 1
    split(bisect_by=Plane(origin=(148.7, 176.5, 0), x_dir=(0, -1, 0), z_dir=(-0.707106781, 0, -0.707106781)), keep=Keep.TOP)


solid = Compound([part.part, body_2.part, body_3.part, body_4.part, body_5.part, body_6.part])
